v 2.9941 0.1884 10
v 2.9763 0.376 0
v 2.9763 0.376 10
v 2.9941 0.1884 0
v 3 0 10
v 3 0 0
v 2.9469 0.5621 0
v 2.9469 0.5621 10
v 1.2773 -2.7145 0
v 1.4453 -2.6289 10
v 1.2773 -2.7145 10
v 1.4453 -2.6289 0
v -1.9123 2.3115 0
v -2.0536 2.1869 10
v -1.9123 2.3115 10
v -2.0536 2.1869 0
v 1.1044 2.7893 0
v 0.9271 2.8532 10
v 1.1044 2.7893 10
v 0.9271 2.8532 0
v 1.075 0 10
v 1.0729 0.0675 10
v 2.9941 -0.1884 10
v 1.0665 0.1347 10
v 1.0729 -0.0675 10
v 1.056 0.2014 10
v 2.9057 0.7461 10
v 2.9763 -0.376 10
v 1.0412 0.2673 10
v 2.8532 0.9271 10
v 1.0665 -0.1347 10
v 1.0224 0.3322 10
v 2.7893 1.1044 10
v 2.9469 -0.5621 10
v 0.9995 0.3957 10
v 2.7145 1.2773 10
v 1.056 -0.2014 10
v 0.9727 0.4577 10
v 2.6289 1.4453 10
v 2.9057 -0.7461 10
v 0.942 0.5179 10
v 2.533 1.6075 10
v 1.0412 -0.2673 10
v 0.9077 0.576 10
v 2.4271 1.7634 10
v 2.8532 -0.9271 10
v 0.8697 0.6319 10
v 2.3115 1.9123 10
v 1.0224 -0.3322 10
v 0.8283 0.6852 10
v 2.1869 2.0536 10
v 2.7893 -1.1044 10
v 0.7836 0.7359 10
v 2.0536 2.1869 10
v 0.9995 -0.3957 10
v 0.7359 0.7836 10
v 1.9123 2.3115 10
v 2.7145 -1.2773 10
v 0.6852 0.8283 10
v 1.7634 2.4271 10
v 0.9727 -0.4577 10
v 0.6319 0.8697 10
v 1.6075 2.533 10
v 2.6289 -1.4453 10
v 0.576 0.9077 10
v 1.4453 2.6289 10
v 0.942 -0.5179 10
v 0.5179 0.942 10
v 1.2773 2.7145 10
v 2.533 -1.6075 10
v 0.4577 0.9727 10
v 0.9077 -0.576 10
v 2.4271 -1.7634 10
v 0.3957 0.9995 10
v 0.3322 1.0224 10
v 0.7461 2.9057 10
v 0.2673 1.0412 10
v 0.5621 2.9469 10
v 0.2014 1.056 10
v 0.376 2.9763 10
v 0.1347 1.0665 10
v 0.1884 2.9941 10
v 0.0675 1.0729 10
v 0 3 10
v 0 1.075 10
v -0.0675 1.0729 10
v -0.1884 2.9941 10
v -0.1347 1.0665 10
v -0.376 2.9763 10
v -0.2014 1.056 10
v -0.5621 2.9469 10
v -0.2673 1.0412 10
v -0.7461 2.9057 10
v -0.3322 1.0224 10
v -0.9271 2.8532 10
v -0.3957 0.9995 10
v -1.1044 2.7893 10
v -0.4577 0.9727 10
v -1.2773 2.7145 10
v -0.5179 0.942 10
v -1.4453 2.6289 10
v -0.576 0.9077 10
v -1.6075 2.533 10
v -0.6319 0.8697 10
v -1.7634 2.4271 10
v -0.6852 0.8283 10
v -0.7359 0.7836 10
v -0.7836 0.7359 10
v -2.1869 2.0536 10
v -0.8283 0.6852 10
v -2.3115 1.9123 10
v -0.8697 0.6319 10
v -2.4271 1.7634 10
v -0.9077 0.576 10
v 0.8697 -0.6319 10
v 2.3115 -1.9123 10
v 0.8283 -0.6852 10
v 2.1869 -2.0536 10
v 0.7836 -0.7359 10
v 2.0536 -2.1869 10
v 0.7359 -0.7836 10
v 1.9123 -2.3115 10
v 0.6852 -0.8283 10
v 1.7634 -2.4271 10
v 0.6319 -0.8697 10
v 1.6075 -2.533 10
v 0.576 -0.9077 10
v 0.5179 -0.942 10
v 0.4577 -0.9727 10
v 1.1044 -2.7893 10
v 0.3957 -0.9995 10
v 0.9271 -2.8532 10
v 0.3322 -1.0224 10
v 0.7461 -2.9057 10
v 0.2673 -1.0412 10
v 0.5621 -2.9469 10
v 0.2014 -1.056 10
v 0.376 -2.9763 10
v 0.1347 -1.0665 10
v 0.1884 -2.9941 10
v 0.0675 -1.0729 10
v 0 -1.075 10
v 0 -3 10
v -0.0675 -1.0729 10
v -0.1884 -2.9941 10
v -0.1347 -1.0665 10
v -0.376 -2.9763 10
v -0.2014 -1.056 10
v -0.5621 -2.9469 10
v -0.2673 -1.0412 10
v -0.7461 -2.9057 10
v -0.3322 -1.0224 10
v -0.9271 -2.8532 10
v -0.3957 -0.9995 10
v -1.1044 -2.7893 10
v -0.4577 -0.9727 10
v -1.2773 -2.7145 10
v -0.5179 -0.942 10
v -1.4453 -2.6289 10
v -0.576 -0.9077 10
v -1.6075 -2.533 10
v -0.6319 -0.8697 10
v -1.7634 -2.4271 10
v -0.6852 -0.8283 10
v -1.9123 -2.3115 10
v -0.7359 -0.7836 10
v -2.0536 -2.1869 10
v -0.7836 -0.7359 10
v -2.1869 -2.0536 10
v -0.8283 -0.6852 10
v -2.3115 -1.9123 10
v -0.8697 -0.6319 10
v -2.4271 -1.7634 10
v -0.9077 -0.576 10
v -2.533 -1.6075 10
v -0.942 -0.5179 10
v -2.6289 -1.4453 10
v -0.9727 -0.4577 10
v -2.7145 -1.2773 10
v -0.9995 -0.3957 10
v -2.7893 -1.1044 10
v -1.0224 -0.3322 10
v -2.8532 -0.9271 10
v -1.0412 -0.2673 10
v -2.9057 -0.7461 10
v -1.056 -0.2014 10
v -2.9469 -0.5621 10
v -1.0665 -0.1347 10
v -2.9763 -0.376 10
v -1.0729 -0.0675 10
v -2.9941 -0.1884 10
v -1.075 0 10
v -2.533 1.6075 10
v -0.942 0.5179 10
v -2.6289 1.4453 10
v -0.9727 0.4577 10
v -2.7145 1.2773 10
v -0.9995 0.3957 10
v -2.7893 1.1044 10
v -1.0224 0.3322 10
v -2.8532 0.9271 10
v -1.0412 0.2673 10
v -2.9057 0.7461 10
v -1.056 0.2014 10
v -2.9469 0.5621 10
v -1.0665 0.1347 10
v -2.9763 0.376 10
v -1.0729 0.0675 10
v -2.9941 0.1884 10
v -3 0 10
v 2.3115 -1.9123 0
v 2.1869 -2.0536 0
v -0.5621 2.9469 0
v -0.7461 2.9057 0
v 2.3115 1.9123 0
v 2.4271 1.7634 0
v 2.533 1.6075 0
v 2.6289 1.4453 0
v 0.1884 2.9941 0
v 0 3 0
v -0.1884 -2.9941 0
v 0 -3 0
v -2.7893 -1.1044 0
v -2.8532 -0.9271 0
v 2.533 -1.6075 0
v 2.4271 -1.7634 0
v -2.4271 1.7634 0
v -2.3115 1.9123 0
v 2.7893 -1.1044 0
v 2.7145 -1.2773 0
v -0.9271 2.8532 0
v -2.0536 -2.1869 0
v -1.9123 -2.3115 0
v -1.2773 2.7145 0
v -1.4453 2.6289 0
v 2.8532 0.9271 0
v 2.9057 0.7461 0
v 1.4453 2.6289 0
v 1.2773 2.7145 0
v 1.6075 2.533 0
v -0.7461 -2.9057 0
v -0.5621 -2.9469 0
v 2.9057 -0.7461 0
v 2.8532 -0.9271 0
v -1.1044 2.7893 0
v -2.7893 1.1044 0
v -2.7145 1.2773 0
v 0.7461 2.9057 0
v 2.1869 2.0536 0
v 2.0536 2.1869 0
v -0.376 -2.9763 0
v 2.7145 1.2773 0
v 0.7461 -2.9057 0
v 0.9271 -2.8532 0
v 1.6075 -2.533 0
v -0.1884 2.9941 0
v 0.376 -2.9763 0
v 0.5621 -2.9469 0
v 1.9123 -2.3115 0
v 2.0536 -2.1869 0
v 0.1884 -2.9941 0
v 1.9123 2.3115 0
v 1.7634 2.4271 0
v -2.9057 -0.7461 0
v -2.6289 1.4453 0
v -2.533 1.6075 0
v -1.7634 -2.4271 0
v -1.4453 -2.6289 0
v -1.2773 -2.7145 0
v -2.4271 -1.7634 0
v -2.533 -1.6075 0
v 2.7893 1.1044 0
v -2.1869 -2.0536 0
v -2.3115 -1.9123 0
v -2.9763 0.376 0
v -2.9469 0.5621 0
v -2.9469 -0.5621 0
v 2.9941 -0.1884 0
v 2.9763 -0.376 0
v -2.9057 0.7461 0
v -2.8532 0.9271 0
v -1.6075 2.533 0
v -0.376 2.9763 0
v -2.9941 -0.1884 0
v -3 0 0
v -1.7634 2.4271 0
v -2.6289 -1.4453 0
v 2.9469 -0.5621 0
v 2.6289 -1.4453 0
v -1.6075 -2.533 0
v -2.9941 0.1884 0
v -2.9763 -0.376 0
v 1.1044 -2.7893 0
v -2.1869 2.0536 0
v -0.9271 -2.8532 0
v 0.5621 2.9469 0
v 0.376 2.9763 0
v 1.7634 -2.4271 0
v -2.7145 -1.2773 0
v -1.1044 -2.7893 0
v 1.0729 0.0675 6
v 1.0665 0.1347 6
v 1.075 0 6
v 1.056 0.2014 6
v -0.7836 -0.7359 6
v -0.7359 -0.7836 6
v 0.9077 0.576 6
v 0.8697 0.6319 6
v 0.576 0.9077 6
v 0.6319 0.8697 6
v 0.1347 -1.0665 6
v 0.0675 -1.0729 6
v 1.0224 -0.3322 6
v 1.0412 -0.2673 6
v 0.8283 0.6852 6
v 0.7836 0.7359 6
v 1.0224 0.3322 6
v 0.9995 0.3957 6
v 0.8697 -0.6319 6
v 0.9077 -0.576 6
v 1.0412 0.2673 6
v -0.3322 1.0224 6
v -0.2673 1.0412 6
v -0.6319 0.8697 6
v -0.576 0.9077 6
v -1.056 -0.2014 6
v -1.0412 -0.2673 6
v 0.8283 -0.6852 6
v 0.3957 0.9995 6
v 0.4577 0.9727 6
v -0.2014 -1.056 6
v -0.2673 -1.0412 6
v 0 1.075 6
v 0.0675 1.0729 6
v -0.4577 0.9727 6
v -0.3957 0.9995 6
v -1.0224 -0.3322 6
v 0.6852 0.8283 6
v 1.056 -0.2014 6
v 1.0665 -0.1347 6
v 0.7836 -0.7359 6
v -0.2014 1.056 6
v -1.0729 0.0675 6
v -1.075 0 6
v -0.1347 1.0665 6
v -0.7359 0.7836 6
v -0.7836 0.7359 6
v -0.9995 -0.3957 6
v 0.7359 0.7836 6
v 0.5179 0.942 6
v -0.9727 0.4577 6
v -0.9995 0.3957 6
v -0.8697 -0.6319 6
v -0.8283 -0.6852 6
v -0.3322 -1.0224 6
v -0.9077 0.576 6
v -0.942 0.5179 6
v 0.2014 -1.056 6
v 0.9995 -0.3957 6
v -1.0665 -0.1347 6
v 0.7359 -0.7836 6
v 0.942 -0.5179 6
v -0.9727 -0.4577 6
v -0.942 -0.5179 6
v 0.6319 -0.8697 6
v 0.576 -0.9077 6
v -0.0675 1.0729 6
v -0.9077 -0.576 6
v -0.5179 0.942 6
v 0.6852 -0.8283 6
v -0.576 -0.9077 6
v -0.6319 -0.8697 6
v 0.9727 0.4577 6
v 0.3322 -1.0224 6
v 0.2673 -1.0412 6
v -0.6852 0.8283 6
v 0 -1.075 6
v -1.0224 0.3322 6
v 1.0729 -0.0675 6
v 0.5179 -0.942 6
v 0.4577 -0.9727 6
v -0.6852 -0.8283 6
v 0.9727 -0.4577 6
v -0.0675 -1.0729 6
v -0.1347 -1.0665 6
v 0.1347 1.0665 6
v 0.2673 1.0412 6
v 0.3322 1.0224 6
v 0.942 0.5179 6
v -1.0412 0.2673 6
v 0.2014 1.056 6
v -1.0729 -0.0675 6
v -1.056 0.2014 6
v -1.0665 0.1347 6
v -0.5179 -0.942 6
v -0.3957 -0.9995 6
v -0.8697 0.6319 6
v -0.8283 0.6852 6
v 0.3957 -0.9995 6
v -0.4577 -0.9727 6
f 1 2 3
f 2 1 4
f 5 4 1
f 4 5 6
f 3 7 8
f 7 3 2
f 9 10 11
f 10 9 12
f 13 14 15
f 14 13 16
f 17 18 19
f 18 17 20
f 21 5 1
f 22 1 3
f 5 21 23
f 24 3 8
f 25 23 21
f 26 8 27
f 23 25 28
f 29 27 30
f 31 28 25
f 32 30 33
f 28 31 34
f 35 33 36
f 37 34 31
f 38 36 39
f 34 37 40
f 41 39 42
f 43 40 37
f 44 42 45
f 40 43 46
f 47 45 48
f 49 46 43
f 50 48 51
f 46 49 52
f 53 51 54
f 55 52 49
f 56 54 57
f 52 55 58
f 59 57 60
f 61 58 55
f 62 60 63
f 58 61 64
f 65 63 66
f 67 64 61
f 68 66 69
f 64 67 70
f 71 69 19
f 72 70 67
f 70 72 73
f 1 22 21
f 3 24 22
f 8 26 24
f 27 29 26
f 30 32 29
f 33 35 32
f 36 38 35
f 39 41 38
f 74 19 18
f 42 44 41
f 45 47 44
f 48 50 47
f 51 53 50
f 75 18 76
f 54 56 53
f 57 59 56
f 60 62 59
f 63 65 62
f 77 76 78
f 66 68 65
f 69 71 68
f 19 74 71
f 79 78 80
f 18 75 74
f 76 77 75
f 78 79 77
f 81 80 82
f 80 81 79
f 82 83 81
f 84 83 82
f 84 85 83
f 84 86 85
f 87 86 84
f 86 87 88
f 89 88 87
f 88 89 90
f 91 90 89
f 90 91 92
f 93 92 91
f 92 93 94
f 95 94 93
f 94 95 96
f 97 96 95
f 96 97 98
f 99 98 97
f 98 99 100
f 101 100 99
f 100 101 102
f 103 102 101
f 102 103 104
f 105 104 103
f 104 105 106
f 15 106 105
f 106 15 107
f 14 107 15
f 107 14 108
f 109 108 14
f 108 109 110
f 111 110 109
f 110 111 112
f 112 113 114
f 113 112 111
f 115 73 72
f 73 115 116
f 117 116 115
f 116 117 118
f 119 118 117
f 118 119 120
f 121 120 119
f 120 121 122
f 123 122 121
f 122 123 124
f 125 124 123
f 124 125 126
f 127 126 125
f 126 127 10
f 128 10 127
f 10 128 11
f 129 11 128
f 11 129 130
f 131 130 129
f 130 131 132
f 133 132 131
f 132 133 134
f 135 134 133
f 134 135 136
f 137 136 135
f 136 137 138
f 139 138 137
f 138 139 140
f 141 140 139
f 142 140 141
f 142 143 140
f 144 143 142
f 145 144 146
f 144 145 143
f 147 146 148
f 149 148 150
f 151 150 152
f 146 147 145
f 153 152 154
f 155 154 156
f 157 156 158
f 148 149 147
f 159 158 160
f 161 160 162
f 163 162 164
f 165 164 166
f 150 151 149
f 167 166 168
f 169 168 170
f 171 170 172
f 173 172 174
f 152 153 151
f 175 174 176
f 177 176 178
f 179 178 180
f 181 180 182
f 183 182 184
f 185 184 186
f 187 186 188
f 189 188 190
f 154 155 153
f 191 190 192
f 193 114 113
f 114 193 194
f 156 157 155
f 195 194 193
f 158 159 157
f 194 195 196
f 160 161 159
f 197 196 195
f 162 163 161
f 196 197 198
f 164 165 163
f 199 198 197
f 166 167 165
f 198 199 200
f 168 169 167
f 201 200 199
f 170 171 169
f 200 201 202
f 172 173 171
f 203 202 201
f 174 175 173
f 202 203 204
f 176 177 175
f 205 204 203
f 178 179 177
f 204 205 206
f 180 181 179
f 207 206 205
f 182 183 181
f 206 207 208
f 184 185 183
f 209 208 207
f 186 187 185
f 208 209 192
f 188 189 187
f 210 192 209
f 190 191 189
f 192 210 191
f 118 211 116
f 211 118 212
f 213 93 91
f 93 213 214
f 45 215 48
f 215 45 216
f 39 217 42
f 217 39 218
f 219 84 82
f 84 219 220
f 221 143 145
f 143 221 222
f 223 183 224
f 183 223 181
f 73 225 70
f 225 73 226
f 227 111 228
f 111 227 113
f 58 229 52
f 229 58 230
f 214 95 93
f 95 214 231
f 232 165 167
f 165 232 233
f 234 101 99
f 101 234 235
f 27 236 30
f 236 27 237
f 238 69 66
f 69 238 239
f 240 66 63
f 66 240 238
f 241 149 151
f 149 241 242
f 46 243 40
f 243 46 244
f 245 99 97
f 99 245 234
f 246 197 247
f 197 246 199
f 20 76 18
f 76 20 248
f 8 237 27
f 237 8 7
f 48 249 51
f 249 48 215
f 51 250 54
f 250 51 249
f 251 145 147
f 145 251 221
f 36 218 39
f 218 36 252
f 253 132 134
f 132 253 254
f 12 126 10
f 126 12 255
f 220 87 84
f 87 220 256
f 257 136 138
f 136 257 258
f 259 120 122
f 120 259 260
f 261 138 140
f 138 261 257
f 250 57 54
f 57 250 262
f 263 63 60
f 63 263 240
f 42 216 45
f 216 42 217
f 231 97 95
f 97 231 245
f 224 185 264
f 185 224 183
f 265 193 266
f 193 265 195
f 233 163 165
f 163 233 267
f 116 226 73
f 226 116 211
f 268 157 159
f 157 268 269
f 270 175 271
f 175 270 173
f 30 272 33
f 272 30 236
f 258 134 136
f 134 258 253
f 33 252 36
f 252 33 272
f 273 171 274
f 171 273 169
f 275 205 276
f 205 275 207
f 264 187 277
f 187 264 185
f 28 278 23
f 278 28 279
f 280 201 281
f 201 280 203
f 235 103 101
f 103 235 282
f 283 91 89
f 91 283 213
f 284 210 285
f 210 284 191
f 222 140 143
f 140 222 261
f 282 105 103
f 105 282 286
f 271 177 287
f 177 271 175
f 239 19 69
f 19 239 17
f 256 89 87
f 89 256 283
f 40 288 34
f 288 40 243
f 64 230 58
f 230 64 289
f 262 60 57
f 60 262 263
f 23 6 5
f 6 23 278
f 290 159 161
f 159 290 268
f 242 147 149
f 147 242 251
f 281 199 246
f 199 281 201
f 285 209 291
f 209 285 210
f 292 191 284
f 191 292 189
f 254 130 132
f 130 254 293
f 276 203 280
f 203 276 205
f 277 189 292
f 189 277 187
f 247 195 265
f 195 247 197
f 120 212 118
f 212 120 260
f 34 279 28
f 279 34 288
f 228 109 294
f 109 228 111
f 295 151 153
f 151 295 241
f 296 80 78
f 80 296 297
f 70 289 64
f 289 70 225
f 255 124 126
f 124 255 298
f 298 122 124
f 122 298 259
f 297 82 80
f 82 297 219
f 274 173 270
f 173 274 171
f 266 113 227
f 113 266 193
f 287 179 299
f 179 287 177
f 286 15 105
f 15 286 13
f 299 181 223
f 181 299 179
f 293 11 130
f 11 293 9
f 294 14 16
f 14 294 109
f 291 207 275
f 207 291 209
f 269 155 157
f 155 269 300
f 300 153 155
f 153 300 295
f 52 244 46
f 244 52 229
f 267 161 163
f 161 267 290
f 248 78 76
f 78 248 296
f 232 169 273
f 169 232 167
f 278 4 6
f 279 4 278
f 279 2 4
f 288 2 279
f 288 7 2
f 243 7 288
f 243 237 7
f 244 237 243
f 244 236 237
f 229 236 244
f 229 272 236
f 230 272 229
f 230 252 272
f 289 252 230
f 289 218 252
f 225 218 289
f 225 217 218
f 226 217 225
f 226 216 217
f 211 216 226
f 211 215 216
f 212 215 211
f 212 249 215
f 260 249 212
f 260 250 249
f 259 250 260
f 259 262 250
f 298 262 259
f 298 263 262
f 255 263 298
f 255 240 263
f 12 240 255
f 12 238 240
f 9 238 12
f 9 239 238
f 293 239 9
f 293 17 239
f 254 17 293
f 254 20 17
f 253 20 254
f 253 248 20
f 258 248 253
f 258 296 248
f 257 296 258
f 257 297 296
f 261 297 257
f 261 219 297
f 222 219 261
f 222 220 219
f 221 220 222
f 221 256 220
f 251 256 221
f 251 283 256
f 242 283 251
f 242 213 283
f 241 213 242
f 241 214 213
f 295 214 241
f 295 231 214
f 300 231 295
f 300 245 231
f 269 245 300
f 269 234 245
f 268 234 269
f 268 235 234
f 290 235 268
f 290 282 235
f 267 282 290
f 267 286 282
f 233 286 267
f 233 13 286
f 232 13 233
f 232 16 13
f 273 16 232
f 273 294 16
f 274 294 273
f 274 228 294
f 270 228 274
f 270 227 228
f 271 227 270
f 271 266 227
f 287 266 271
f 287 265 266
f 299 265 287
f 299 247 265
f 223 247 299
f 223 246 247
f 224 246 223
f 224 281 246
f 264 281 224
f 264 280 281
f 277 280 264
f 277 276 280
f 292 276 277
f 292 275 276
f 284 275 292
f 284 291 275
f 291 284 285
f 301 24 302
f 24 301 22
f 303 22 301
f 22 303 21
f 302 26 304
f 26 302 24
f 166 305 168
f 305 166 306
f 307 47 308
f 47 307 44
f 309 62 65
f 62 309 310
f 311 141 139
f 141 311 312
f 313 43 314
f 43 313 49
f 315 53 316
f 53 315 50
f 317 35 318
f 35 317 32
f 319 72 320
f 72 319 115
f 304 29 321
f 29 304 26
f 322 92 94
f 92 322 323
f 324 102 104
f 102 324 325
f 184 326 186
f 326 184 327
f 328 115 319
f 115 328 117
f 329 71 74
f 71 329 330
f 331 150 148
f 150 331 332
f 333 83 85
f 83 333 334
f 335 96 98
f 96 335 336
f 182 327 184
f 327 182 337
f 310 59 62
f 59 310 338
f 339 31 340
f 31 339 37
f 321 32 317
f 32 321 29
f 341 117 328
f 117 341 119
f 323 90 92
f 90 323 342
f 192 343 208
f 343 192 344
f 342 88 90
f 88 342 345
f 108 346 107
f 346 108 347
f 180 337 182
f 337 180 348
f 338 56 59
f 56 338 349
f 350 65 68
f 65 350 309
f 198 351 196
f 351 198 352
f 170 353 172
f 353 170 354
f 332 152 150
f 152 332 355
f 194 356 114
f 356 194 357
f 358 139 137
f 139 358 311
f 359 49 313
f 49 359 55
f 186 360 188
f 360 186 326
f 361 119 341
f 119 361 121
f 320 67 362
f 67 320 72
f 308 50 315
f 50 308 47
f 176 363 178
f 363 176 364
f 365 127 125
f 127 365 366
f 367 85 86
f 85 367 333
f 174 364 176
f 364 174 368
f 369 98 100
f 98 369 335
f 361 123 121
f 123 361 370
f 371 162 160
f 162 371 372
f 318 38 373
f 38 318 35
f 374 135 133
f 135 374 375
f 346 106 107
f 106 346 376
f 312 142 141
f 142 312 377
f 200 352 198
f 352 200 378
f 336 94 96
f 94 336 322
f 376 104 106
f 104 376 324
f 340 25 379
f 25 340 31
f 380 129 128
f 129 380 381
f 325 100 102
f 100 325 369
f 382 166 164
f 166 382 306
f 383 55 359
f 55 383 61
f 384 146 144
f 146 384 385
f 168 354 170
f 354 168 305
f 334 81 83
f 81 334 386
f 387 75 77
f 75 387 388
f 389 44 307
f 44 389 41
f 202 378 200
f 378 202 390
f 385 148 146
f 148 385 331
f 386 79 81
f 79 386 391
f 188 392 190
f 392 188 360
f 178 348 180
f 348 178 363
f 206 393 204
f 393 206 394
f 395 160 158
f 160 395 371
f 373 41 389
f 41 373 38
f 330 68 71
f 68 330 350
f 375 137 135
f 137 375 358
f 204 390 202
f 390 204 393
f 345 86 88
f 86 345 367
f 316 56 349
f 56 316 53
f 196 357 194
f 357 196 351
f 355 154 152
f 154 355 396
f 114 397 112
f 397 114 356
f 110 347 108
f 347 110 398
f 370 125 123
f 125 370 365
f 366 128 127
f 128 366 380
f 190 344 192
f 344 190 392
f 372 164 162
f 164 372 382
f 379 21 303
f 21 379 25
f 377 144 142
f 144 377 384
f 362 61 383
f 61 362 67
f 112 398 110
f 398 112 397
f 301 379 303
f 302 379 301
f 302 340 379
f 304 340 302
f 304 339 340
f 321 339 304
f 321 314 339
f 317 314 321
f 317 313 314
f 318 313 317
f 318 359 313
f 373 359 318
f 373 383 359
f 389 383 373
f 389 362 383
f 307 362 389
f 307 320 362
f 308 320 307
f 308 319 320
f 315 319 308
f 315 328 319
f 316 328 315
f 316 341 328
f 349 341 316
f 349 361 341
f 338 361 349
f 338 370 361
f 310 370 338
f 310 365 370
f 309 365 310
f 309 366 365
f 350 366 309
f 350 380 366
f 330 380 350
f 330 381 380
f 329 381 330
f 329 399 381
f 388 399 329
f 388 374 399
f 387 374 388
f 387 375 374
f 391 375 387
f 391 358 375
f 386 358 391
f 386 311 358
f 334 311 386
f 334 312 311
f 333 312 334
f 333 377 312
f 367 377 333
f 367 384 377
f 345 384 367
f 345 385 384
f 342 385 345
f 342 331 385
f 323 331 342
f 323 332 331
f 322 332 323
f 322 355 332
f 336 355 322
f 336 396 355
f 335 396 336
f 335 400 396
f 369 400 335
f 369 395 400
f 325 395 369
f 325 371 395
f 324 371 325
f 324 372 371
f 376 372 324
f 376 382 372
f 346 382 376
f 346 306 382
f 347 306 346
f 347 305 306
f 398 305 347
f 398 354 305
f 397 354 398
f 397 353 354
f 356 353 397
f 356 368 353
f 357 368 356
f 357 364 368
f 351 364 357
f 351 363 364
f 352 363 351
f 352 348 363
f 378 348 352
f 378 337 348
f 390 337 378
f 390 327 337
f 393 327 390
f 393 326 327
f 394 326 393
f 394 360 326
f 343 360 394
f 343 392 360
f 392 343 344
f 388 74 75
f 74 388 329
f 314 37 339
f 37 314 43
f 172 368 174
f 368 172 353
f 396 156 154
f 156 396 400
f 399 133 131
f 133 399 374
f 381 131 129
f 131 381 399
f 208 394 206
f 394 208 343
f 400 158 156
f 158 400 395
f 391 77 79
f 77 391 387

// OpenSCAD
$fn=100;

magnet_diameter = 18.00;
magnet_height = 2.91;

walls = 1.5;

magnet_slot_tol = 0.35;
manget_slot_height_tol = 0.4;

magnet_slot_width = magnet_diameter + magnet_slot_tol;
magnet_slot_height = magnet_height + manget_slot_height_tol;

cross_length = 7;
cross_tol = 0.3;

pin = 2.15;
pin_height = 4;
pin_diameter = 6;
pin_diameter_tol = 0.15;

adapter_height = 10;

magnet_slot_edge = 2;

plate_width = magnet_slot_width*2+walls*2;
plate_height = magnet_slot_height+walls*2;

echo(plate_width);
echo(plate_height);

//difference() {
//    holder();
//    cross();
//}

pin_header();



module holder() {
    difference() {
        hull() {
          translate([magnet_slot_width/2,0,0]) cylinder(h=plate_height, r=magnet_slot_width/2+walls);
          translate([-magnet_slot_width/2,0,0]) cylinder(h=plate_height, r=magnet_slot_width/2+walls);
        }
        translate([magnet_slot_width/2,0,plate_height-magnet_slot_height]) cylinder(h=magnet_slot_height+1, r=magnet_slot_width/2);
        translate([-magnet_slot_width/2,0,plate_height-magnet_slot_height]) cylinder(h=magnet_slot_height+1, r=magnet_slot_width/2);
        translate([0,0,10+walls*2]) cube([7,7,20], center=true);
    }
}

module cross() {
    w = walls + cross_tol;
    l = cross_length + cross_tol;
    h = walls/2+cross_tol;
    p = pin_diameter + pin_diameter_tol;
    translate([0,0,(h+1)/2-1]) cylinder(h=h+100,r=p/2, center=true);
}

module pin_header() {
    difference() {
        cylinder(h=adapter_height,r=pin_diameter/2);
        translate([0,0,adapter_height-pin_height]) cylinder(h=adapter_height+10,r=pin/2);
    }
}
